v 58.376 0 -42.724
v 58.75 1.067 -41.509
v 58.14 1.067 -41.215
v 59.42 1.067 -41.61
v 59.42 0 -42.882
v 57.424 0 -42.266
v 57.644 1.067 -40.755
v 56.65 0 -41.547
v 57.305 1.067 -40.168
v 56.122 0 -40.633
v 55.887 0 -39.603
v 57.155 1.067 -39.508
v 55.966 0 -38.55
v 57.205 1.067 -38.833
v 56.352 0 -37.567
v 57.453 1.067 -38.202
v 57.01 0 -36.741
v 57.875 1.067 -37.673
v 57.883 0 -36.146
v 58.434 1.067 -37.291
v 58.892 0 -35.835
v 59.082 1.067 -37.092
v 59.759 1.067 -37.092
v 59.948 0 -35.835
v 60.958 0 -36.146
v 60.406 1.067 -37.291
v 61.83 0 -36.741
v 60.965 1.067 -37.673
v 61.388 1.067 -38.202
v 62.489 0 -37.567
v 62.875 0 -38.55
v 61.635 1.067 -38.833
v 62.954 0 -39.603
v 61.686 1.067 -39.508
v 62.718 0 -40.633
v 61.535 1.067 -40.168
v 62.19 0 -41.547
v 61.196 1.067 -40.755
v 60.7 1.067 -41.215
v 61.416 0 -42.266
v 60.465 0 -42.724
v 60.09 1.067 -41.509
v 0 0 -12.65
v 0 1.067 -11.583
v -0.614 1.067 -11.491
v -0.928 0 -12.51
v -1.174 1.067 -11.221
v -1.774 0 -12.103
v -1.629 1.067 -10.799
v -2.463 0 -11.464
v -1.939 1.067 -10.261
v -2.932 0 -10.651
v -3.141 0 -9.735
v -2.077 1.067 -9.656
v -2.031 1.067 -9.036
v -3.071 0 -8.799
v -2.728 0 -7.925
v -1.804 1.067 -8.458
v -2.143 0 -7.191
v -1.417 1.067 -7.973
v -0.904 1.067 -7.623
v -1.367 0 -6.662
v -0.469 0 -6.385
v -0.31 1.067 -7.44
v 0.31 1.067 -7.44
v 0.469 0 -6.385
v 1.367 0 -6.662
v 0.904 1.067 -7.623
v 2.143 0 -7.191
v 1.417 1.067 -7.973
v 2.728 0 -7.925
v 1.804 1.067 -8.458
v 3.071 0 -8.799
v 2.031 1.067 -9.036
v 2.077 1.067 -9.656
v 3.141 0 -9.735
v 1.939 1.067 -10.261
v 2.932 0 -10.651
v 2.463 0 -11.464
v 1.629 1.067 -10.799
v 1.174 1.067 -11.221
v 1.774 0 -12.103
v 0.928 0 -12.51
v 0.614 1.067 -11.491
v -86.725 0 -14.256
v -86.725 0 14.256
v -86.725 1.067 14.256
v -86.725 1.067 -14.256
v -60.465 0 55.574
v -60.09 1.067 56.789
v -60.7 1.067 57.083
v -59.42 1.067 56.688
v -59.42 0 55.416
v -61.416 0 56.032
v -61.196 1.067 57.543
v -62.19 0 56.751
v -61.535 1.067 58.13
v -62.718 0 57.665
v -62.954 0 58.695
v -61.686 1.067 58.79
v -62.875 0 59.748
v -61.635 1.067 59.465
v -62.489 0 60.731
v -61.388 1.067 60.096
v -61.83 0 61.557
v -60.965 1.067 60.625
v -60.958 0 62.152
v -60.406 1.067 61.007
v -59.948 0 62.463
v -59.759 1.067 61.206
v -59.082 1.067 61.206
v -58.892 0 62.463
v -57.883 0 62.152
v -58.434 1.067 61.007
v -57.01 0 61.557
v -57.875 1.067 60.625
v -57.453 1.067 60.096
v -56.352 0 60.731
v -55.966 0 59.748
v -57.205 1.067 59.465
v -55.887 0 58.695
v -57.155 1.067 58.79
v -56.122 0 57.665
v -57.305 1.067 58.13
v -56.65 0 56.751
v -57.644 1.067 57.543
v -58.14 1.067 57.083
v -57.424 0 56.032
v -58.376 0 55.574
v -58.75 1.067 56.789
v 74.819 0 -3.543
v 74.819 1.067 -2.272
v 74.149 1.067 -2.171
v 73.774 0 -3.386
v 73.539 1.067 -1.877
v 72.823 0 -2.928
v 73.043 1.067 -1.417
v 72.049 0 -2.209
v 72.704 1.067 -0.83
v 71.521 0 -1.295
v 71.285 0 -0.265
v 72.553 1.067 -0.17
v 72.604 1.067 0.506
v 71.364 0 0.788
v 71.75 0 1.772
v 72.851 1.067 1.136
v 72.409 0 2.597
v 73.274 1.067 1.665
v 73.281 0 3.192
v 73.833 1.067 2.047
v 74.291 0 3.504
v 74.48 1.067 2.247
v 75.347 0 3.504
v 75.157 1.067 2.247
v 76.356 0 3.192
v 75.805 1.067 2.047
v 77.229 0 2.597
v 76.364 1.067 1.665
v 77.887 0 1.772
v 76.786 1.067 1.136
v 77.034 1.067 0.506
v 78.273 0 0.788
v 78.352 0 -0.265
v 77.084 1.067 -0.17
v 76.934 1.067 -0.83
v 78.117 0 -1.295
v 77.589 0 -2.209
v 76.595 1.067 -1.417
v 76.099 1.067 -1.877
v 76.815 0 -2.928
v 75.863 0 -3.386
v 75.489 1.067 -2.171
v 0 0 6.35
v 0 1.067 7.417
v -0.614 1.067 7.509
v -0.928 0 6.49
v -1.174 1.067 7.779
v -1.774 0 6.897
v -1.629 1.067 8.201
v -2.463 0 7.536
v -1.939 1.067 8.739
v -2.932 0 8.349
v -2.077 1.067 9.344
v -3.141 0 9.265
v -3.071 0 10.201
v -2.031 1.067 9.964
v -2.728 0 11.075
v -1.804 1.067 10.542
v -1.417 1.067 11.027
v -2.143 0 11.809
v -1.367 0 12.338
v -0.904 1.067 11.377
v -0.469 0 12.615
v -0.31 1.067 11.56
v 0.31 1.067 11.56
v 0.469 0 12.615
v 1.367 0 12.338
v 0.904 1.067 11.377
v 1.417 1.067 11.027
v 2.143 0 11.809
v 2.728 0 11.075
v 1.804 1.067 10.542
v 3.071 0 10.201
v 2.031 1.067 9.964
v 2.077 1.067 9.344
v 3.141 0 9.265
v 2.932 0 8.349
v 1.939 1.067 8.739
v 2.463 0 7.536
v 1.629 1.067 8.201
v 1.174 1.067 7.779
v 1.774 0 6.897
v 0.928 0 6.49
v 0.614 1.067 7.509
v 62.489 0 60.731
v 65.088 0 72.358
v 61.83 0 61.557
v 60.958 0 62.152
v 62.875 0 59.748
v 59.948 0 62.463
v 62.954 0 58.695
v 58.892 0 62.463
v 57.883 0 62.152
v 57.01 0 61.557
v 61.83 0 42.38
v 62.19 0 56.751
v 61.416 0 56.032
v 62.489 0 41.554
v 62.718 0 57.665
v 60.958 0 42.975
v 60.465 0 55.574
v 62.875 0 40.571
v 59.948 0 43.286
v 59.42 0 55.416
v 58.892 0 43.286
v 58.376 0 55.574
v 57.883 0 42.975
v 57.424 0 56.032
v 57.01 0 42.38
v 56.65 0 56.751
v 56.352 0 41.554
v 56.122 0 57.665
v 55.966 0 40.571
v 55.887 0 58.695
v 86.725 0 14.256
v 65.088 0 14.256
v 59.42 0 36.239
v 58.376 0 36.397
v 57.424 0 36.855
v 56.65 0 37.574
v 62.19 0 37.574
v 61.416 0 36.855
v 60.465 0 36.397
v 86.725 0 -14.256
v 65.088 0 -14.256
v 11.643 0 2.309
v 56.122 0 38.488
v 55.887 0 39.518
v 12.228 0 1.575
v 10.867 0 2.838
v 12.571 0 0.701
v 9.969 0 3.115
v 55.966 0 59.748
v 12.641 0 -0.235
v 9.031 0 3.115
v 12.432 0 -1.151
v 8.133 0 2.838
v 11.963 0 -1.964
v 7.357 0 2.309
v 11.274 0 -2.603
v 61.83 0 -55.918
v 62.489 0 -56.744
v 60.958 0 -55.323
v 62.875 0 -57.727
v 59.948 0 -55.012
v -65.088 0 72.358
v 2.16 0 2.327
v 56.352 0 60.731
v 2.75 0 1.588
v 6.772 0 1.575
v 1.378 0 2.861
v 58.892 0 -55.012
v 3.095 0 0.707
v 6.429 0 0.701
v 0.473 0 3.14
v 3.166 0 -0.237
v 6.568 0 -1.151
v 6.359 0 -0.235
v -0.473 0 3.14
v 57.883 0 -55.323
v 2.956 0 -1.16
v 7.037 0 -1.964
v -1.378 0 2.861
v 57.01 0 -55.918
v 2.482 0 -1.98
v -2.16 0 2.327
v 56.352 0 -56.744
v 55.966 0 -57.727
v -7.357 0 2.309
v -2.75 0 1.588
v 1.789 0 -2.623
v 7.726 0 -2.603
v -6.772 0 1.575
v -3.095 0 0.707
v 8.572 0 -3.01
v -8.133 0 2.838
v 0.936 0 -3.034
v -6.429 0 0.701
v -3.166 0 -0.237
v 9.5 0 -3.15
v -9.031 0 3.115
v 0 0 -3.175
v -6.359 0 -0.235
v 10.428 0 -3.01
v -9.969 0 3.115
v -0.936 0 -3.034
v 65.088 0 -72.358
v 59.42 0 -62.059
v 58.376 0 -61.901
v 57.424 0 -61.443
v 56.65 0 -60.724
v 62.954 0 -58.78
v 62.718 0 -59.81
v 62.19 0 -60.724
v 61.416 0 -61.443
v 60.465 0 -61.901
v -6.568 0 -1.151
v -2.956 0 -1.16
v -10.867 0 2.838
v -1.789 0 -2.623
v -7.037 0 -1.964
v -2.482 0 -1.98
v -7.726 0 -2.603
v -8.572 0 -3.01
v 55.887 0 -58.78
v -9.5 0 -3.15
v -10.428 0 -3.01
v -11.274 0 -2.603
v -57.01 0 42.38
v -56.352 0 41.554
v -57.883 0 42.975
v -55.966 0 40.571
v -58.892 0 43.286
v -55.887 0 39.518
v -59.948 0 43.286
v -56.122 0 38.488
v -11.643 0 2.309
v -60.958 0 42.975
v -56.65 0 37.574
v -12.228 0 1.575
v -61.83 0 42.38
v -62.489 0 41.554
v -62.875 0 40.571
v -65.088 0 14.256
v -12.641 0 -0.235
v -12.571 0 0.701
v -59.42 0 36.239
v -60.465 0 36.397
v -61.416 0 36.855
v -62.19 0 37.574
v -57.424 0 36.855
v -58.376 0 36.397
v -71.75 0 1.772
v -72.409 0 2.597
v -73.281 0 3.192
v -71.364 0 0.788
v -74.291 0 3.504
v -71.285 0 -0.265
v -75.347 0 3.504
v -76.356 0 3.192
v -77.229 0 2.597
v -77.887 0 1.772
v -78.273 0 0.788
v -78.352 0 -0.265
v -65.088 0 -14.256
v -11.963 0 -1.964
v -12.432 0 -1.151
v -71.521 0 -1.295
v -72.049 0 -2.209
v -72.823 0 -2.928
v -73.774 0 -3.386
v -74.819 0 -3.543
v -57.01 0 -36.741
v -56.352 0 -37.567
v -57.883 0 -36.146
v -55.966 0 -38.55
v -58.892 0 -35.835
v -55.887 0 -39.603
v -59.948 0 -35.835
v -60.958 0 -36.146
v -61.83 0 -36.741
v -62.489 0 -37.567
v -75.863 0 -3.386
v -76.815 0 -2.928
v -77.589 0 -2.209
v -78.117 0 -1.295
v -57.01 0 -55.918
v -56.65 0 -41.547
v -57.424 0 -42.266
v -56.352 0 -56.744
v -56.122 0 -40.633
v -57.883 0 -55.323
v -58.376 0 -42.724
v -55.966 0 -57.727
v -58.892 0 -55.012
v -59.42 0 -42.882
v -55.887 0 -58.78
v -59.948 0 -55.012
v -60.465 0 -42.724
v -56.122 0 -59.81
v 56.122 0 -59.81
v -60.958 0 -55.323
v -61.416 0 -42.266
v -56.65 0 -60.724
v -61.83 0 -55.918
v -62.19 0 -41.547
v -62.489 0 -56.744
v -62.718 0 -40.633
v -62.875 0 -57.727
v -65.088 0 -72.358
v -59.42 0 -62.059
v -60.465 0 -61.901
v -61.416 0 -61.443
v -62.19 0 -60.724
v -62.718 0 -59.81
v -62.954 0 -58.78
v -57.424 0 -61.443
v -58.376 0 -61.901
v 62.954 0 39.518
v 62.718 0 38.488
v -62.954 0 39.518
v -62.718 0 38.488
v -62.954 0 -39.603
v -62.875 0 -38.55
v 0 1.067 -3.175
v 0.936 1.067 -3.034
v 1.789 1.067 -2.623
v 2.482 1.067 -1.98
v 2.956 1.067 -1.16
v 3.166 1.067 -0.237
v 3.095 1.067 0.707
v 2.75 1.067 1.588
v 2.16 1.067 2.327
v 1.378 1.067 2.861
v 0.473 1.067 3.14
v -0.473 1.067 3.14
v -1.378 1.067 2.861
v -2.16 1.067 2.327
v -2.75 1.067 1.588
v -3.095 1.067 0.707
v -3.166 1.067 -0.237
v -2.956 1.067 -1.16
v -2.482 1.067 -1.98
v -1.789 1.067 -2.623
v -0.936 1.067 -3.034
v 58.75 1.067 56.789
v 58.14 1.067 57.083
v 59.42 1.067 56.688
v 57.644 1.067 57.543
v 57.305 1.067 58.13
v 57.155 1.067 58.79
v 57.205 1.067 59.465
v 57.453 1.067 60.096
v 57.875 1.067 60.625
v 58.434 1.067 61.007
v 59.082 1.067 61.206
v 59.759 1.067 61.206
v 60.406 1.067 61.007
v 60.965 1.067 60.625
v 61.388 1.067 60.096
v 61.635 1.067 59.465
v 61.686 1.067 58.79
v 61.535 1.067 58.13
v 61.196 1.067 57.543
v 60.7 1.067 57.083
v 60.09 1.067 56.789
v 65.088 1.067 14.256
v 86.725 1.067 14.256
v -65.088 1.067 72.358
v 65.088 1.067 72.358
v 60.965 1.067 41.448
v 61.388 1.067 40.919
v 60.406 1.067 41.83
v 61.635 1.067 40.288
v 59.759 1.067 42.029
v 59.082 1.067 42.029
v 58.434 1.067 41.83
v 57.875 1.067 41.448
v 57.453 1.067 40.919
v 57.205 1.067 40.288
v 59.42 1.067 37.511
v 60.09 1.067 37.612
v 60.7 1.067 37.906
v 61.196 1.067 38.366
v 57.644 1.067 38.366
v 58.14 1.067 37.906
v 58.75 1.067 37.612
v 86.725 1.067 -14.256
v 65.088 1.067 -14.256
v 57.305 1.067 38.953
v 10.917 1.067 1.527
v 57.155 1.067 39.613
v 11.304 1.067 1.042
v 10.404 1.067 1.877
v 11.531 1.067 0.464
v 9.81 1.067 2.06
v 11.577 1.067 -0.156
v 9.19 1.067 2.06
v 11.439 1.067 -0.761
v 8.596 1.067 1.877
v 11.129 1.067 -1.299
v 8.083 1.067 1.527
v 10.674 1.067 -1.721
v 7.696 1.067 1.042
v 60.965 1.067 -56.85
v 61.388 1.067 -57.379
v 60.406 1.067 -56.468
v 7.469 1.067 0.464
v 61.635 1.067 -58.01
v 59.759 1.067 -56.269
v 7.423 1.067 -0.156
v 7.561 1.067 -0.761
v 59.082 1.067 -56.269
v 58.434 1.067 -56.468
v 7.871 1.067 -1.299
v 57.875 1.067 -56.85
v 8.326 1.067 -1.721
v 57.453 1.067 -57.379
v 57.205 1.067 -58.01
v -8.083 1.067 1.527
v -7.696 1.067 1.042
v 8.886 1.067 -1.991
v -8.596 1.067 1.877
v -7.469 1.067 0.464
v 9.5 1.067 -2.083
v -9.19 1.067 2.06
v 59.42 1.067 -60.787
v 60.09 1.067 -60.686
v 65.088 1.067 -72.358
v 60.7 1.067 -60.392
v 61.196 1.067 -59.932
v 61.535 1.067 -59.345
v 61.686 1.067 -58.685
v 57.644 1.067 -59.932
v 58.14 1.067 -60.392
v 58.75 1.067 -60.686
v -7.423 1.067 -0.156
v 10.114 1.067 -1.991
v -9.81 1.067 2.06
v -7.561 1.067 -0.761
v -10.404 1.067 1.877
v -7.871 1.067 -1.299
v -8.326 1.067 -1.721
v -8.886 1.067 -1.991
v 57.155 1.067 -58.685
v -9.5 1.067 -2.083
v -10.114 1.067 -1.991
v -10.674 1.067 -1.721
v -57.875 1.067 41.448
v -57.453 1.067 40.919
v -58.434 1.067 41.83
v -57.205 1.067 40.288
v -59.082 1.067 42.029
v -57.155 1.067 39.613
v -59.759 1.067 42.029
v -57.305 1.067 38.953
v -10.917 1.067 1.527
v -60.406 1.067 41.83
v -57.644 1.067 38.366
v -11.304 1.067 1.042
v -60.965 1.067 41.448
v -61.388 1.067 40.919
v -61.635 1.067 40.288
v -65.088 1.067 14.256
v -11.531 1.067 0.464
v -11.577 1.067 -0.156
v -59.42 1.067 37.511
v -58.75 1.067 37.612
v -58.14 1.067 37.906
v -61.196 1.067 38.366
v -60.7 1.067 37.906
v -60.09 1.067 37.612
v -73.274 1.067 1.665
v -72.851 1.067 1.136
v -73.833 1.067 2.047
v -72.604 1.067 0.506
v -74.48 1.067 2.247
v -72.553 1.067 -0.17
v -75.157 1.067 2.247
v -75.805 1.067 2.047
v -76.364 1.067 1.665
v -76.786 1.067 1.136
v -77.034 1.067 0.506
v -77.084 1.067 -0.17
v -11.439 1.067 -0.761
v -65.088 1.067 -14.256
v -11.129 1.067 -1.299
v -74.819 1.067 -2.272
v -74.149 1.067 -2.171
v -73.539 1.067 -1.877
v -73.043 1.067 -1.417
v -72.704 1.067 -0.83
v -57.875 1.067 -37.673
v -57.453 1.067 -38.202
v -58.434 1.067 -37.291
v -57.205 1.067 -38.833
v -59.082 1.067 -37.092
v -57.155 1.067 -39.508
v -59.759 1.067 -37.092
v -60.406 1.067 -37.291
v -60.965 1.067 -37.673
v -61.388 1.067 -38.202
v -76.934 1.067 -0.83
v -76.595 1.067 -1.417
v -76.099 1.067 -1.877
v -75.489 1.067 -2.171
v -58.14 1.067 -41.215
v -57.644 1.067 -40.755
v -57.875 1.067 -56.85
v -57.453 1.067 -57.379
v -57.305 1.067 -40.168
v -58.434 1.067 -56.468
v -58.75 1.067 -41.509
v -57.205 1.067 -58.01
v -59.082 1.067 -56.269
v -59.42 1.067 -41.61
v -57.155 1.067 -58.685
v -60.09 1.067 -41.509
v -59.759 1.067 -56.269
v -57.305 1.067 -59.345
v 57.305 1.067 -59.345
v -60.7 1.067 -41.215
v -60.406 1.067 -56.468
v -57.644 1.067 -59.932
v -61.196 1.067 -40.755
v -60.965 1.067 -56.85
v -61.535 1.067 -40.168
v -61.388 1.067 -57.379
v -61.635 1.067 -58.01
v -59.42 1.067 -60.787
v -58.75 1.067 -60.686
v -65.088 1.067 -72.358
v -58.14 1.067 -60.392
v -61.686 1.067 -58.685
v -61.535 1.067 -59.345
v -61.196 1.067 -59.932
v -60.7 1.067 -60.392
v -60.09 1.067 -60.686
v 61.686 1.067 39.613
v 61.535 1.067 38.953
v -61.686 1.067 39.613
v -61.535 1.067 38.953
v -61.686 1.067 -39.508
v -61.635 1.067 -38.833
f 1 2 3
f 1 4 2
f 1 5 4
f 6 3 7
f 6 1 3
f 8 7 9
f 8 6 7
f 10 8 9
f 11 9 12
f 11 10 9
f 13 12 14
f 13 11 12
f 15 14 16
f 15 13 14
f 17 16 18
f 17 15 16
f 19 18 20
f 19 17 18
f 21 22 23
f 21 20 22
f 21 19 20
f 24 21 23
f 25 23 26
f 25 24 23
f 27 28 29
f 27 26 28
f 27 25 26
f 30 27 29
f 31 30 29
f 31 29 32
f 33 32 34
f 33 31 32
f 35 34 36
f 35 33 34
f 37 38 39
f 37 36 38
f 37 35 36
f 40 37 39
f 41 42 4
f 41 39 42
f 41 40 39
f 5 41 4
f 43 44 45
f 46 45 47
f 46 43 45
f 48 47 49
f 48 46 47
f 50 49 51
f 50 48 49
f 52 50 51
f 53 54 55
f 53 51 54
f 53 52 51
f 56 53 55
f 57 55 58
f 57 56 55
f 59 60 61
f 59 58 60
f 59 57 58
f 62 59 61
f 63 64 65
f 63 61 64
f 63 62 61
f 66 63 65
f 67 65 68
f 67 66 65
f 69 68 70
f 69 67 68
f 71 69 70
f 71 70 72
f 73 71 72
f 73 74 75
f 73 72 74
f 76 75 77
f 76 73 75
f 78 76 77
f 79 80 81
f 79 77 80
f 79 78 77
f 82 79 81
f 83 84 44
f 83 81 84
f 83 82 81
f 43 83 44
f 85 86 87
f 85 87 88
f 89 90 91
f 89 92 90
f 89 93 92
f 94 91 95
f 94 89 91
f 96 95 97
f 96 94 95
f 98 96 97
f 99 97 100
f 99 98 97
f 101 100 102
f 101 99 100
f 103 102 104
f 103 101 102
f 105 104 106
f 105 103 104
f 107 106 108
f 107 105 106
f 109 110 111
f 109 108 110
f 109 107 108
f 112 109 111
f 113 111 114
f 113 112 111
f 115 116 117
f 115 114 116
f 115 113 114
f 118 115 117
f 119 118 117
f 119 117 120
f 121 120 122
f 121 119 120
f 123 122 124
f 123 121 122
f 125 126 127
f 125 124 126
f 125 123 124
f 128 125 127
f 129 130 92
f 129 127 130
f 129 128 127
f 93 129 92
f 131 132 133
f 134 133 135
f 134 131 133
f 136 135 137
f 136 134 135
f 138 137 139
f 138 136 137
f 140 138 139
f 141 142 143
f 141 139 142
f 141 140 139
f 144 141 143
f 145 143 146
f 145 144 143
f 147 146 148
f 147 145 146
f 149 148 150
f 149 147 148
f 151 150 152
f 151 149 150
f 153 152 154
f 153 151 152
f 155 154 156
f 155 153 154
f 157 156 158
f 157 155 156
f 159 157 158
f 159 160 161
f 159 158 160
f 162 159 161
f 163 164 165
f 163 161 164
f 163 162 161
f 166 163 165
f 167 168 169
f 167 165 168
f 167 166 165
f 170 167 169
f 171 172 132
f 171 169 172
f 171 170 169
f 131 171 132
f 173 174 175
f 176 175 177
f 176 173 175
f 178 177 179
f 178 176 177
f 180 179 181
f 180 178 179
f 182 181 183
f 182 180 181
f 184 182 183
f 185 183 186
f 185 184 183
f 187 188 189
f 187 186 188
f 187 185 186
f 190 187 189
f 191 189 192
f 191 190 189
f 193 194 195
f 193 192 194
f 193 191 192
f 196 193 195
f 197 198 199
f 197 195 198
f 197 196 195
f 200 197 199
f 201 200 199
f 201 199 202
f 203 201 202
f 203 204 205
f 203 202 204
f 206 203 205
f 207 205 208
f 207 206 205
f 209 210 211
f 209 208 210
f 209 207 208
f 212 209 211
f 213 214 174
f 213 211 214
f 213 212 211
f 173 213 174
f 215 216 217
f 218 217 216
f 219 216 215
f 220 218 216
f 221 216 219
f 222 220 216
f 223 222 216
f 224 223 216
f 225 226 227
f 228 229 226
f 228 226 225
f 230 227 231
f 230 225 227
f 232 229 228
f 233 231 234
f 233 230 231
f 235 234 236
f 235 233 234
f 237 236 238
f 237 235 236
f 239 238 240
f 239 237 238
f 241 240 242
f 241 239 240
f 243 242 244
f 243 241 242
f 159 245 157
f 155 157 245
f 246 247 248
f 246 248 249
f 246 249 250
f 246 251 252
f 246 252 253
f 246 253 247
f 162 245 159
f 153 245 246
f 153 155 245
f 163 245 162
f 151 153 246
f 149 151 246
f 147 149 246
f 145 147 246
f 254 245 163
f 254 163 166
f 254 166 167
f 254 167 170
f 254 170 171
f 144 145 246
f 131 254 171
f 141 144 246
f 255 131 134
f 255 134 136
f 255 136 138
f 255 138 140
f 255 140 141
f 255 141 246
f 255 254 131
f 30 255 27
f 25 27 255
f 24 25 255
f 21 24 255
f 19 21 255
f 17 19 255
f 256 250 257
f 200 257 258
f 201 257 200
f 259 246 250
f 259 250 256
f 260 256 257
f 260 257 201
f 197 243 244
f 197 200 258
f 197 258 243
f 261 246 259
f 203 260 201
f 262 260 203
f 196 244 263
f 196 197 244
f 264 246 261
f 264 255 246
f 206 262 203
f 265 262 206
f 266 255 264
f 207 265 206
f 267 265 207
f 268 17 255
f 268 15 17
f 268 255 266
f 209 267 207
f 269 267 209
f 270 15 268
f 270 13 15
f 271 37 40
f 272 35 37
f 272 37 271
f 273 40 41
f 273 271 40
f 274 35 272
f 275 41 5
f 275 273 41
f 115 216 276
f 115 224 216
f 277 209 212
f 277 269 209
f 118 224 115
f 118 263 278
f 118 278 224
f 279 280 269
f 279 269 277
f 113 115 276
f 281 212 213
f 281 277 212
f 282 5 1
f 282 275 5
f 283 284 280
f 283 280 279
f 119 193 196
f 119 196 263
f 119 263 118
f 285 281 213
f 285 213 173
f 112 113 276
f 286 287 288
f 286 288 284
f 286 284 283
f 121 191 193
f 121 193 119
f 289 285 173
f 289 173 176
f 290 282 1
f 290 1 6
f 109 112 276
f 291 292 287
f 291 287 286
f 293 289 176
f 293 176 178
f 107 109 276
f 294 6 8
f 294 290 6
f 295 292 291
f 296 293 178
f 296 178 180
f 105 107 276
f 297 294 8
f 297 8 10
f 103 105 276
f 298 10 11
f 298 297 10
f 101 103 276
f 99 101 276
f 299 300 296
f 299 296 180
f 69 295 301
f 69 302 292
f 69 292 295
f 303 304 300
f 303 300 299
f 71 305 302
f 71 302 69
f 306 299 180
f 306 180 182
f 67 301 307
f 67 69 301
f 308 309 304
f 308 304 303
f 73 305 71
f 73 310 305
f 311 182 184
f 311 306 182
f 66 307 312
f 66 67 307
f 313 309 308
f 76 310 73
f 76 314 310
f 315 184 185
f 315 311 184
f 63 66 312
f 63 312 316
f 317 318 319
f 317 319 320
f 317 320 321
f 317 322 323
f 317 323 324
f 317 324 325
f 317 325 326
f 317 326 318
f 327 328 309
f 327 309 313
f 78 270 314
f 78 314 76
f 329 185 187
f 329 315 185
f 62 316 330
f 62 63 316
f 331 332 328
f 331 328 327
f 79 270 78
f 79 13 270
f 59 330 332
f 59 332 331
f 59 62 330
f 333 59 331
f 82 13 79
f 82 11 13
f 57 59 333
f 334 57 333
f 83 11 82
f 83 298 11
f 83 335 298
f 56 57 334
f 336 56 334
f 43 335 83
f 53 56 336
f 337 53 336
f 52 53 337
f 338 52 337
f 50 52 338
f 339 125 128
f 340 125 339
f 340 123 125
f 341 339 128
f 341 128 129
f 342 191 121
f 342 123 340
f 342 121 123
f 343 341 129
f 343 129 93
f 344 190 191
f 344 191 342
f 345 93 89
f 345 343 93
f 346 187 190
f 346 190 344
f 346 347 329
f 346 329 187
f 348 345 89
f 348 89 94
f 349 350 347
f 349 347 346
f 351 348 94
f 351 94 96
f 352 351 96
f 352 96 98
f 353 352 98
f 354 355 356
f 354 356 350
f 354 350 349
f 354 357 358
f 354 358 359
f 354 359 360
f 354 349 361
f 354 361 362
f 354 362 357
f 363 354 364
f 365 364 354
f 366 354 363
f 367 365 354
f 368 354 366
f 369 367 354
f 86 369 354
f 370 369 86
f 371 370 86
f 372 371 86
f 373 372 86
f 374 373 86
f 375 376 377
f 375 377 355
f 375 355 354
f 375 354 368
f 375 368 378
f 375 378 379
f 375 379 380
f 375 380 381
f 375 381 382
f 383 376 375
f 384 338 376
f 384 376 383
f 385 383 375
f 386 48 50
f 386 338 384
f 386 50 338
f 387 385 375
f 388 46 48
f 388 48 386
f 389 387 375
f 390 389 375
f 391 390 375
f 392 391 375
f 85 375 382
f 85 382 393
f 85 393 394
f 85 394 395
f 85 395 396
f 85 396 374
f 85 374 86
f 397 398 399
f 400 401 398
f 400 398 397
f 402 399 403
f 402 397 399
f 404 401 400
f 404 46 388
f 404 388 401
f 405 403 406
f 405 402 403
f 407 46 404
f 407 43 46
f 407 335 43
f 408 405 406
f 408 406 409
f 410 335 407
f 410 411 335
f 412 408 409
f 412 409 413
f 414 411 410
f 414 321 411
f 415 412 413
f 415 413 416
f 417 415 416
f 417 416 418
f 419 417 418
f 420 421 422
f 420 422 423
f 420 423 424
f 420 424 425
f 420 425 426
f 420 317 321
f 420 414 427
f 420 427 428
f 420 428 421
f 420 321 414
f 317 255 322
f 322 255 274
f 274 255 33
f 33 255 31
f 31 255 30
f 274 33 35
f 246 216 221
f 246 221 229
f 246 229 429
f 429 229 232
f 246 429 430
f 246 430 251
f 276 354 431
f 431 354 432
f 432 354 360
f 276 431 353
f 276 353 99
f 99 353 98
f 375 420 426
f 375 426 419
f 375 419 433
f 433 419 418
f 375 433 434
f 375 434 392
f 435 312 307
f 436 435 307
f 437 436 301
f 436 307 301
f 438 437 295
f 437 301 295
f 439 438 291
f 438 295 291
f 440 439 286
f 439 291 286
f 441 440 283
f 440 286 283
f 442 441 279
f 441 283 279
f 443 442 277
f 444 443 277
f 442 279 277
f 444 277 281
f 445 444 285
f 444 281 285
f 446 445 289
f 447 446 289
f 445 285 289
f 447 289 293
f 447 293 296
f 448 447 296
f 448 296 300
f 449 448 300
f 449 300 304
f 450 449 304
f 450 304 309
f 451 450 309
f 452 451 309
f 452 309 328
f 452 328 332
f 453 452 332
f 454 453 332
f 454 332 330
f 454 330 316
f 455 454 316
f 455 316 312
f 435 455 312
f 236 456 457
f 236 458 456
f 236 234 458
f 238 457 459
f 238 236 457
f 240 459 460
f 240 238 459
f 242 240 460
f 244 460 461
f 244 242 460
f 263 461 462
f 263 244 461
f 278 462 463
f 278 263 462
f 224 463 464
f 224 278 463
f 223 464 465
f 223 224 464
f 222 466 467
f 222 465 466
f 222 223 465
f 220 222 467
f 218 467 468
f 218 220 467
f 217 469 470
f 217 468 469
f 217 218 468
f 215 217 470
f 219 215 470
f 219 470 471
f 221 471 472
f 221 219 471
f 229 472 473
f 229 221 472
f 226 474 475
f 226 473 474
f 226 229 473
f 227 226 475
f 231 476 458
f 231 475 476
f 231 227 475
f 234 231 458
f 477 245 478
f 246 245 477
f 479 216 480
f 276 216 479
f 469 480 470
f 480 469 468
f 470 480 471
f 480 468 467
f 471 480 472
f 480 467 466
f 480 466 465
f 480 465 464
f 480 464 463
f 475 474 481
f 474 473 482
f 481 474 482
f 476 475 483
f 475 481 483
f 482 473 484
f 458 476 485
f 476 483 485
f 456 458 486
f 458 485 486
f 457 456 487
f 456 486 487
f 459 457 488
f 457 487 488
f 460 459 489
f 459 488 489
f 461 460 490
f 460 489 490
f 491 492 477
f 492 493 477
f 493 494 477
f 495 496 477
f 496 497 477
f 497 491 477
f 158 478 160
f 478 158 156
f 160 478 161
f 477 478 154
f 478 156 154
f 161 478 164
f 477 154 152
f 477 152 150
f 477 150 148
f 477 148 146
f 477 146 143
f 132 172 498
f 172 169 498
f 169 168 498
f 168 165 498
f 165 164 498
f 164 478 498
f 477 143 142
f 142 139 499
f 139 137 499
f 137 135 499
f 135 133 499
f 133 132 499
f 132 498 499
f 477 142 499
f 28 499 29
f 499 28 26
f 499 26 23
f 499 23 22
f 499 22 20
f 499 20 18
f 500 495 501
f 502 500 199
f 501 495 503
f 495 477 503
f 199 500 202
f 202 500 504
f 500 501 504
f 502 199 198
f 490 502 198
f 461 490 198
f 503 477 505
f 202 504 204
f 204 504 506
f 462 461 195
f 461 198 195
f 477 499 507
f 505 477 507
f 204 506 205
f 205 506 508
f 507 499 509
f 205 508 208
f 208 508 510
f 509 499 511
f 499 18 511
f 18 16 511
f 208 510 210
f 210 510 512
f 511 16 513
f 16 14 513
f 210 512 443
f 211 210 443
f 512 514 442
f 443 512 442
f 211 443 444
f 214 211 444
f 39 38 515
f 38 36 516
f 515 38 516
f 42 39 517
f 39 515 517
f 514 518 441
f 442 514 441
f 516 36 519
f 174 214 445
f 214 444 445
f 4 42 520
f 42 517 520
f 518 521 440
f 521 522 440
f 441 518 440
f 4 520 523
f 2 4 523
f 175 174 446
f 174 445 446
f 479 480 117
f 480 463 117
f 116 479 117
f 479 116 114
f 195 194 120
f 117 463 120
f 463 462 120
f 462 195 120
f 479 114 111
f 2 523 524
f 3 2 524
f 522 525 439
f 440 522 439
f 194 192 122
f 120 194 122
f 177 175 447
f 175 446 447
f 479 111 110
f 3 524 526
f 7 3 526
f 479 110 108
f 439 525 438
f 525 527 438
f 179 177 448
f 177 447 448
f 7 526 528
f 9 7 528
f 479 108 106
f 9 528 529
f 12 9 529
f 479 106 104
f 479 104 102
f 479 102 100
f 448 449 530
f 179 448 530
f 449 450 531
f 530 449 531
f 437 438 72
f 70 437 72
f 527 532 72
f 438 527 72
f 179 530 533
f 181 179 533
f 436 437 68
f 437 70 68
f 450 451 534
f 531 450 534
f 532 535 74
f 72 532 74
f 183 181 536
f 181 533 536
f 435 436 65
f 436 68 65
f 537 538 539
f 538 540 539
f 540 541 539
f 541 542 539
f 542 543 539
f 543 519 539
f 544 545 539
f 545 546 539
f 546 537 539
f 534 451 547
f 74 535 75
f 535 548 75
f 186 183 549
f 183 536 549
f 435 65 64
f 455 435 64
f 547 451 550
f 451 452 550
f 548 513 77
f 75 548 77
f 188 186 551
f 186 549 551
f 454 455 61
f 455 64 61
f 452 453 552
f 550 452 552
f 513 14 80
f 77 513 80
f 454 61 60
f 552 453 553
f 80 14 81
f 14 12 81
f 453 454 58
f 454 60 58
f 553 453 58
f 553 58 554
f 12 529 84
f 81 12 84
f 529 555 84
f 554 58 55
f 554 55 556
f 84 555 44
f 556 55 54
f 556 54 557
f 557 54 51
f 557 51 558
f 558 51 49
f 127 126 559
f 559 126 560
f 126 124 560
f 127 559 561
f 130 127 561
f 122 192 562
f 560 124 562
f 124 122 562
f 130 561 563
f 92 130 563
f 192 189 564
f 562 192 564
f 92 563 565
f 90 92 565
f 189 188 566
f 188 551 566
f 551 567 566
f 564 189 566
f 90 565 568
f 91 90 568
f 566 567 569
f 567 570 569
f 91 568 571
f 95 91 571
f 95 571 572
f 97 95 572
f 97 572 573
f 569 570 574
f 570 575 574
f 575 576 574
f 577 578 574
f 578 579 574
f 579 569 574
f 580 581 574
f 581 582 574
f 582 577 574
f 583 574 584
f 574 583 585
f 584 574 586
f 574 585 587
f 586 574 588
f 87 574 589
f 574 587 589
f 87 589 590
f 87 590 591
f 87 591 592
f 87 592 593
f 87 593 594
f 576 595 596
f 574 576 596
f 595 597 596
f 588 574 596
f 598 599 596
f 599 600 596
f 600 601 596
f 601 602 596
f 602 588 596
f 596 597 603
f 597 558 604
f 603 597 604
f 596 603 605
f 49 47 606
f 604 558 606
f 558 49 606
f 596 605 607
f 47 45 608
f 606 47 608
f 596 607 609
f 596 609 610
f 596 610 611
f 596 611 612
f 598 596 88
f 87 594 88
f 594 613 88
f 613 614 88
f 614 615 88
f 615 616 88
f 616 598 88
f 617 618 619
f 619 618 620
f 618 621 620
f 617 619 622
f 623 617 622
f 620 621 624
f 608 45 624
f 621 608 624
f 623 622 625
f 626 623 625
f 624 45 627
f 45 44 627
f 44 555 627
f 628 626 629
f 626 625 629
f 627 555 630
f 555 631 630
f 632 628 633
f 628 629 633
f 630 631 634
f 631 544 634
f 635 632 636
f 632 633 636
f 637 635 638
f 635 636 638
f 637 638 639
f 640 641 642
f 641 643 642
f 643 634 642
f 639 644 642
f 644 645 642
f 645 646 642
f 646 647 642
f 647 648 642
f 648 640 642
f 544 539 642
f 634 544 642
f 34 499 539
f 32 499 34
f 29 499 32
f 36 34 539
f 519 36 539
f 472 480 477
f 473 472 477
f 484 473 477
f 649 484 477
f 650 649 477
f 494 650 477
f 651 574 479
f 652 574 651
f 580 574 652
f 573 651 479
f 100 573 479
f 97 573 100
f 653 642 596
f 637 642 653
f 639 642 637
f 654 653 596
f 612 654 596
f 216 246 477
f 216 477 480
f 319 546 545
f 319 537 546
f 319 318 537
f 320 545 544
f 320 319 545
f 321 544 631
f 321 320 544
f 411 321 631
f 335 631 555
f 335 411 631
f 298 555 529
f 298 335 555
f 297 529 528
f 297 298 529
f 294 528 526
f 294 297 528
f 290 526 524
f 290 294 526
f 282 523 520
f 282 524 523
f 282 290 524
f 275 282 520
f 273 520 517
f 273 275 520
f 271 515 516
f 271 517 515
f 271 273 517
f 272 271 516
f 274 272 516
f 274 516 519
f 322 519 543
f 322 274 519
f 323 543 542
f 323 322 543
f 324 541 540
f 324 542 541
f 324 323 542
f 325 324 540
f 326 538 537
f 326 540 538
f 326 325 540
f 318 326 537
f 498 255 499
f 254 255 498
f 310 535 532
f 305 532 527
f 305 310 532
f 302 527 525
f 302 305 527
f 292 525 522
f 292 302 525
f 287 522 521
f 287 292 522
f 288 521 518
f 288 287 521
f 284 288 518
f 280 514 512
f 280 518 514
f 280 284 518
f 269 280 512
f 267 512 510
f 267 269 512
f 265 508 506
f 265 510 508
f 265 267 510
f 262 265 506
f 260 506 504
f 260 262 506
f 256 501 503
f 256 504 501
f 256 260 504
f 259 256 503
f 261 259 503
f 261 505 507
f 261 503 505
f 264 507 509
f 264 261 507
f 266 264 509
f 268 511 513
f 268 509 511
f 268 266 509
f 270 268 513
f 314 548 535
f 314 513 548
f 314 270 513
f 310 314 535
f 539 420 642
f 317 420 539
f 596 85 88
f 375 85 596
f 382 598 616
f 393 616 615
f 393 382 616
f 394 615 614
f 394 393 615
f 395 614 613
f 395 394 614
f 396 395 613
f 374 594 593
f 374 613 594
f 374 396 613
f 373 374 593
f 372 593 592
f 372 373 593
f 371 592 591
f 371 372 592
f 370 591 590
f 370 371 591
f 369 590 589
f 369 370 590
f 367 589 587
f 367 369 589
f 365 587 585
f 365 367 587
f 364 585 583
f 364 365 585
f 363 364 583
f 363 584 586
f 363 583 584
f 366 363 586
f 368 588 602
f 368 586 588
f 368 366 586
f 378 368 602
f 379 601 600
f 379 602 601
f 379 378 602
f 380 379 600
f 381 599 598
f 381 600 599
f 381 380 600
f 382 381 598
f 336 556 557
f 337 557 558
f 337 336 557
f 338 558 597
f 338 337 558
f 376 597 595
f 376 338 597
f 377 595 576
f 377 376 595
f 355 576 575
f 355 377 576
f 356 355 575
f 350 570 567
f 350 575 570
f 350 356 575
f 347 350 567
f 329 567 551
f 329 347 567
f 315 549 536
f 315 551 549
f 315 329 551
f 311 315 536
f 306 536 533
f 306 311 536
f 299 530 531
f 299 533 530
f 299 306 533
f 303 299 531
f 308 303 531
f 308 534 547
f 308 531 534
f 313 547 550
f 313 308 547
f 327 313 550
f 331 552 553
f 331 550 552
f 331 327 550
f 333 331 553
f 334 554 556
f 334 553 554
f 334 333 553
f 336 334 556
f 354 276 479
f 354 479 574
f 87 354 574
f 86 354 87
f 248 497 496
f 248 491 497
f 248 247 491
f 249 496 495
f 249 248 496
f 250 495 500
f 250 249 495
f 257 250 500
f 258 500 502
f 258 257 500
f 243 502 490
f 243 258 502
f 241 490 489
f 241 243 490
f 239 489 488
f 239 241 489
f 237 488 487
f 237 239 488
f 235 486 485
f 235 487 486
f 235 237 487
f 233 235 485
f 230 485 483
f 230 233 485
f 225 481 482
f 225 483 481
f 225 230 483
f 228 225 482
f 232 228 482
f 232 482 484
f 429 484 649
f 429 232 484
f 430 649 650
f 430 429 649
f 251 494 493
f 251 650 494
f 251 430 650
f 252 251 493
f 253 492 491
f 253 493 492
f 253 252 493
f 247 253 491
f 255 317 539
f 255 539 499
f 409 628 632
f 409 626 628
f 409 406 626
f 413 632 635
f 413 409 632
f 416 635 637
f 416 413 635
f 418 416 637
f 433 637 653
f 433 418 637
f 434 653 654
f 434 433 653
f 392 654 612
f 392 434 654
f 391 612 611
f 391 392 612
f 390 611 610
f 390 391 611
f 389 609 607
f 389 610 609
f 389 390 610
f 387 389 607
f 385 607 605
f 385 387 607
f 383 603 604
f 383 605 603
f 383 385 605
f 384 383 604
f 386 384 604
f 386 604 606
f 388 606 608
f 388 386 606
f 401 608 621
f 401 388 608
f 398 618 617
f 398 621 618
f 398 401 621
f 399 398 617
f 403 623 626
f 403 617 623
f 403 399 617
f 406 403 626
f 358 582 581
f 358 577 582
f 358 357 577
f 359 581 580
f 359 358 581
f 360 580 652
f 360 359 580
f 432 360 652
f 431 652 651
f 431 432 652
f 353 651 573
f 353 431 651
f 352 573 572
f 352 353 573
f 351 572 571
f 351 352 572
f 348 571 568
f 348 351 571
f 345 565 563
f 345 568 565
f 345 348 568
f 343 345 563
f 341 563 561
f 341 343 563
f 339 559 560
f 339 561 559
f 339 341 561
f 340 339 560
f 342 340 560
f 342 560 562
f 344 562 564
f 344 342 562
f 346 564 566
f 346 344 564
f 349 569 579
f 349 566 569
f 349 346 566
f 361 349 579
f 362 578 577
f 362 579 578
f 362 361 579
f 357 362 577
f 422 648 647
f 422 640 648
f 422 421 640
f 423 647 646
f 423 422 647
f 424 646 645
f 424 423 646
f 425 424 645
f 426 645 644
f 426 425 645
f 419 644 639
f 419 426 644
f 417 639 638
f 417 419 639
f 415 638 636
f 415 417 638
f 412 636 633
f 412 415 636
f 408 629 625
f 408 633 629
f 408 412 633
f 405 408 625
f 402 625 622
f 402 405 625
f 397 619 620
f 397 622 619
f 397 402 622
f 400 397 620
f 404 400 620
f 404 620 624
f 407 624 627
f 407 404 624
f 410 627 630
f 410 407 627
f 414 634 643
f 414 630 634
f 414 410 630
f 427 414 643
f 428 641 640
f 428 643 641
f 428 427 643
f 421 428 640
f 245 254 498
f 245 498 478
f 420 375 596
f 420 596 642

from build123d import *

# Parameters (mm, degrees)
BOSS_EXTRUDE1_DEPTH                            = 1.0668
CSK_FOR_6_FLAT_HEAD_MACHINE_SCREW_2_COUNT      = 2
CSK_FOR_6_FLAT_HEAD_MACHINE_SCREW_2_PITCH      = 117.475
CSK_FOR_6_FLAT_HEAD_MACHINE_SCREW_3_COUNT      = 2
CSK_FOR_6_FLAT_HEAD_MACHINE_SCREW_3_PITCH      = 167.102910264
CSK_FOR_6_FLAT_HEAD_MACHINE_SCREW_4_COUNT      = 2
CSK_FOR_6_FLAT_HEAD_MACHINE_SCREW_4_PITCH      = 118.84025
CSK_FOR_6_FLAT_HEAD_MACHINE_SCREW_5_COUNT      = 2
CSK_FOR_6_FLAT_HEAD_MACHINE_SCREW_5_PITCH      = 120.377583757
CSK_FOR_6_FLAT_HEAD_MACHINE_SCREW_6_COUNT      = 2
CSK_FOR_6_FLAT_HEAD_MACHINE_SCREW_6_PITCH      = 98.298
CSK_FOR_6_FLAT_HEAD_MACHINE_SCREW_7_COUNT      = 2
CSK_FOR_6_FLAT_HEAD_MACHINE_SCREW_7_PITCH      = 154.225495543
CSK_FOR_6_FLAT_HEAD_MACHINE_SCREW_8_COUNT      = 2
CSK_FOR_6_FLAT_HEAD_MACHINE_SCREW_8_PITCH      = 19.177
CSK_FOR_6_FLAT_HEAD_MACHINE_SCREW_9_COUNT      = 2
CSK_FOR_6_FLAT_HEAD_MACHINE_SCREW_9_PITCH      = 60.937464766
CSK_FOR_6_FLAT_HEAD_MACHINE_SCREW_10_COUNT     = 2
CSK_FOR_6_FLAT_HEAD_MACHINE_SCREW_10_PITCH     = 146.616377774
SKETCH4_R                                      = 3.175
CUT_EXTRUDE1_DEPTH                             = 113.951767191
CSK_FOR_M3_FLAT_HEAD_MACHINE_SCREW2_AT_2_COUNT = 2
CSK_FOR_M3_FLAT_HEAD_MACHINE_SCREW2_AT_2_PITCH = 19
CSK_FOR_M3_FLAT_HEAD_MACHINE_SCREW2_AT_3_COUNT = 2
CSK_FOR_M3_FLAT_HEAD_MACHINE_SCREW2_AT_3_PITCH = 13.435028843
CSK_FOR_M3_FLAT_HEAD_MACHINE_SCREW2_AT_4_COUNT = 2
CSK_FOR_M3_FLAT_HEAD_MACHINE_SCREW2_AT_4_PITCH = 13.435028843


with BuildPart() as part:
    # Sketch1 → Boss-Extrude1 (new body)
    with BuildSketch(Plane(origin=(0, 0, 0), x_dir=(1, 0, 0), z_dir=(0, 1, 0))):
        Polygon((-65.0875, 72.35825), (65.0875, 72.35825), (65.0875, 14.25575), (86.725125, 14.25575), (86.725125, -14.25575), (65.0875, -14.25575), (65.0875, -72.35825), (-65.0875, -72.35825), (-65.0875, -14.25575), (-86.725125, -14.25575), (-86.725125, 14.25575), (-65.0875, 14.25575), align=None)
    extrude(amount=BOSS_EXTRUDE1_DEPTH)

    # Sketch2 → CSK for #6 Flat Head Machine Screw (100)1 (revolve, cut)
    with BuildSketch(Plane(origin=(-59.420125, 0, 58.9597584), x_dir=(0, 0, -1), z_dir=(1, 0, 0))):
        Polygon((0, 0), (0, 1.0668), (1.89865, 1.0668), (1.89865, 1.380025208), (3.5433, 0), align=None)
    csk_for_6_flat_head_machine_screw_100 = revolve(axis=Axis((-59.420125, -6.35, 58.9597584), (0, 1, 0)), mode=Mode.SUBTRACT)

    # CSK for _6 Flat Head Machine Screw _ 2: CSK for #6 Flat Head Machine Screw (100)1 ×2
    with Locations(*[(0, 0, -i * CSK_FOR_6_FLAT_HEAD_MACHINE_SCREW_2_PITCH) for i in range(1, CSK_FOR_6_FLAT_HEAD_MACHINE_SCREW_2_COUNT)]):
        add(csk_for_6_flat_head_machine_screw_100, mode=Mode.SUBTRACT)

    # CSK for _6 Flat Head Machine Screw _ 3: CSK for #6 Flat Head Machine Screw (100)1 ×2
    with Locations(*[Vector(0.7111800136357133, 0, -0.7030099488663775) * (i * CSK_FOR_6_FLAT_HEAD_MACHINE_SCREW_3_PITCH) for i in range(1, CSK_FOR_6_FLAT_HEAD_MACHINE_SCREW_3_COUNT)]):
        add(csk_for_6_flat_head_machine_screw_100, mode=Mode.SUBTRACT)

    # CSK for _6 Flat Head Machine Screw _ 4: CSK for #6 Flat Head Machine Screw (100)1 ×2
    with Locations(*[(i * CSK_FOR_6_FLAT_HEAD_MACHINE_SCREW_4_PITCH, 0, 0) for i in range(1, CSK_FOR_6_FLAT_HEAD_MACHINE_SCREW_4_COUNT)]):
        add(csk_for_6_flat_head_machine_screw_100, mode=Mode.SUBTRACT)

    # CSK for _6 Flat Head Machine Screw _ 5: CSK for #6 Flat Head Machine Screw (100)1 ×2
    with Locations(*[Vector(0.9872290694888833, 0, -0.15930713843426378) * (i * CSK_FOR_6_FLAT_HEAD_MACHINE_SCREW_5_PITCH) for i in range(1, CSK_FOR_6_FLAT_HEAD_MACHINE_SCREW_5_COUNT)]):
        add(csk_for_6_flat_head_machine_screw_100, mode=Mode.SUBTRACT)

    # CSK for _6 Flat Head Machine Screw _ 6: CSK for #6 Flat Head Machine Screw (100)1 ×2
    with Locations(*[(0, 0, -i * CSK_FOR_6_FLAT_HEAD_MACHINE_SCREW_6_PITCH) for i in range(1, CSK_FOR_6_FLAT_HEAD_MACHINE_SCREW_6_COUNT)]):
        add(csk_for_6_flat_head_machine_screw_100, mode=Mode.SUBTRACT)

    # CSK for _6 Flat Head Machine Screw _ 7: CSK for #6 Flat Head Machine Screw (100)1 ×2
    with Locations(*[Vector(0.7705616349723654, 0, -0.6373654891102241) * (i * CSK_FOR_6_FLAT_HEAD_MACHINE_SCREW_7_PITCH) for i in range(1, CSK_FOR_6_FLAT_HEAD_MACHINE_SCREW_7_COUNT)]):
        add(csk_for_6_flat_head_machine_screw_100, mode=Mode.SUBTRACT)

    # CSK for _6 Flat Head Machine Screw _ 8: CSK for #6 Flat Head Machine Screw (100)1 ×2
    with Locations(*[(0, 0, -i * CSK_FOR_6_FLAT_HEAD_MACHINE_SCREW_8_PITCH) for i in range(1, CSK_FOR_6_FLAT_HEAD_MACHINE_SCREW_8_COUNT)]):
        add(csk_for_6_flat_head_machine_screw_100, mode=Mode.SUBTRACT)

    # CSK for _6 Flat Head Machine Screw _ 9: CSK for #6 Flat Head Machine Screw (100)1 ×2
    with Locations(*[Vector(-0.2526975820055066, 0, -0.9675453126590869) * (i * CSK_FOR_6_FLAT_HEAD_MACHINE_SCREW_9_PITCH) for i in range(1, CSK_FOR_6_FLAT_HEAD_MACHINE_SCREW_9_COUNT)]):
        add(csk_for_6_flat_head_machine_screw_100, mode=Mode.SUBTRACT)

    # CSK for _6 Flat Head Machine Screw _ 10: CSK for #6 Flat Head Machine Screw (100)1 ×2
    with Locations(*[Vector(0.915579842020543, 0, -0.40213623672287674) * (i * CSK_FOR_6_FLAT_HEAD_MACHINE_SCREW_10_PITCH) for i in range(1, CSK_FOR_6_FLAT_HEAD_MACHINE_SCREW_10_COUNT)]):
        add(csk_for_6_flat_head_machine_screw_100, mode=Mode.SUBTRACT)

    # Sketch4 → Cut-Extrude1 (cut, through all)
    with BuildSketch(Plane.XZ):
        with Locations(Location((0, 0, 0), (0, 0, 270))):
            Circle(SKETCH4_R)
    extrude(amount=-CUT_EXTRUDE1_DEPTH, mode=Mode.SUBTRACT)

    # Sketch5 → CSK for M3 Flat Head Machine Screw2 (revolve, cut)
    with BuildSketch(Plane(origin=(9.5, 0, 0), x_dir=(0, 0, -1), z_dir=(1, 0, 0))):
        Polygon((0, 0), (0, 1.0668), (1.7, 1.0668), (1.7, 1.45), (3.15, 0), align=None)
    csk_for_m3_flat_head_machine_screw2 = revolve(axis=Axis((9.5, -6.35, 0), (0, 1, 0)), mode=Mode.SUBTRACT)

    # CSK for M3 Flat Head Machine Screw2 at 2: CSK for M3 Flat Head Machine Screw2 ×2
    with Locations(*[(-i * CSK_FOR_M3_FLAT_HEAD_MACHINE_SCREW2_AT_2_PITCH, 0, 0) for i in range(1, CSK_FOR_M3_FLAT_HEAD_MACHINE_SCREW2_AT_2_COUNT)]):
        add(csk_for_m3_flat_head_machine_screw2, mode=Mode.SUBTRACT)

    # CSK for M3 Flat Head Machine Screw2 at 3: CSK for M3 Flat Head Machine Screw2 ×2
    with Locations(*[Vector(-0.7071067811865486, 0, -0.7071067811865466) * (i * CSK_FOR_M3_FLAT_HEAD_MACHINE_SCREW2_AT_3_PITCH) for i in range(1, CSK_FOR_M3_FLAT_HEAD_MACHINE_SCREW2_AT_3_COUNT)]):
        add(csk_for_m3_flat_head_machine_screw2, mode=Mode.SUBTRACT)

    # CSK for M3 Flat Head Machine Screw2 at 4: CSK for M3 Flat Head Machine Screw2 ×2
    with Locations(*[Vector(-0.7071067811865486, 0, 0.7071067811865466) * (i * CSK_FOR_M3_FLAT_HEAD_MACHINE_SCREW2_AT_4_PITCH) for i in range(1, CSK_FOR_M3_FLAT_HEAD_MACHINE_SCREW2_AT_4_COUNT)]):
        add(csk_for_m3_flat_head_machine_screw2, mode=Mode.SUBTRACT)


solid = part.part
